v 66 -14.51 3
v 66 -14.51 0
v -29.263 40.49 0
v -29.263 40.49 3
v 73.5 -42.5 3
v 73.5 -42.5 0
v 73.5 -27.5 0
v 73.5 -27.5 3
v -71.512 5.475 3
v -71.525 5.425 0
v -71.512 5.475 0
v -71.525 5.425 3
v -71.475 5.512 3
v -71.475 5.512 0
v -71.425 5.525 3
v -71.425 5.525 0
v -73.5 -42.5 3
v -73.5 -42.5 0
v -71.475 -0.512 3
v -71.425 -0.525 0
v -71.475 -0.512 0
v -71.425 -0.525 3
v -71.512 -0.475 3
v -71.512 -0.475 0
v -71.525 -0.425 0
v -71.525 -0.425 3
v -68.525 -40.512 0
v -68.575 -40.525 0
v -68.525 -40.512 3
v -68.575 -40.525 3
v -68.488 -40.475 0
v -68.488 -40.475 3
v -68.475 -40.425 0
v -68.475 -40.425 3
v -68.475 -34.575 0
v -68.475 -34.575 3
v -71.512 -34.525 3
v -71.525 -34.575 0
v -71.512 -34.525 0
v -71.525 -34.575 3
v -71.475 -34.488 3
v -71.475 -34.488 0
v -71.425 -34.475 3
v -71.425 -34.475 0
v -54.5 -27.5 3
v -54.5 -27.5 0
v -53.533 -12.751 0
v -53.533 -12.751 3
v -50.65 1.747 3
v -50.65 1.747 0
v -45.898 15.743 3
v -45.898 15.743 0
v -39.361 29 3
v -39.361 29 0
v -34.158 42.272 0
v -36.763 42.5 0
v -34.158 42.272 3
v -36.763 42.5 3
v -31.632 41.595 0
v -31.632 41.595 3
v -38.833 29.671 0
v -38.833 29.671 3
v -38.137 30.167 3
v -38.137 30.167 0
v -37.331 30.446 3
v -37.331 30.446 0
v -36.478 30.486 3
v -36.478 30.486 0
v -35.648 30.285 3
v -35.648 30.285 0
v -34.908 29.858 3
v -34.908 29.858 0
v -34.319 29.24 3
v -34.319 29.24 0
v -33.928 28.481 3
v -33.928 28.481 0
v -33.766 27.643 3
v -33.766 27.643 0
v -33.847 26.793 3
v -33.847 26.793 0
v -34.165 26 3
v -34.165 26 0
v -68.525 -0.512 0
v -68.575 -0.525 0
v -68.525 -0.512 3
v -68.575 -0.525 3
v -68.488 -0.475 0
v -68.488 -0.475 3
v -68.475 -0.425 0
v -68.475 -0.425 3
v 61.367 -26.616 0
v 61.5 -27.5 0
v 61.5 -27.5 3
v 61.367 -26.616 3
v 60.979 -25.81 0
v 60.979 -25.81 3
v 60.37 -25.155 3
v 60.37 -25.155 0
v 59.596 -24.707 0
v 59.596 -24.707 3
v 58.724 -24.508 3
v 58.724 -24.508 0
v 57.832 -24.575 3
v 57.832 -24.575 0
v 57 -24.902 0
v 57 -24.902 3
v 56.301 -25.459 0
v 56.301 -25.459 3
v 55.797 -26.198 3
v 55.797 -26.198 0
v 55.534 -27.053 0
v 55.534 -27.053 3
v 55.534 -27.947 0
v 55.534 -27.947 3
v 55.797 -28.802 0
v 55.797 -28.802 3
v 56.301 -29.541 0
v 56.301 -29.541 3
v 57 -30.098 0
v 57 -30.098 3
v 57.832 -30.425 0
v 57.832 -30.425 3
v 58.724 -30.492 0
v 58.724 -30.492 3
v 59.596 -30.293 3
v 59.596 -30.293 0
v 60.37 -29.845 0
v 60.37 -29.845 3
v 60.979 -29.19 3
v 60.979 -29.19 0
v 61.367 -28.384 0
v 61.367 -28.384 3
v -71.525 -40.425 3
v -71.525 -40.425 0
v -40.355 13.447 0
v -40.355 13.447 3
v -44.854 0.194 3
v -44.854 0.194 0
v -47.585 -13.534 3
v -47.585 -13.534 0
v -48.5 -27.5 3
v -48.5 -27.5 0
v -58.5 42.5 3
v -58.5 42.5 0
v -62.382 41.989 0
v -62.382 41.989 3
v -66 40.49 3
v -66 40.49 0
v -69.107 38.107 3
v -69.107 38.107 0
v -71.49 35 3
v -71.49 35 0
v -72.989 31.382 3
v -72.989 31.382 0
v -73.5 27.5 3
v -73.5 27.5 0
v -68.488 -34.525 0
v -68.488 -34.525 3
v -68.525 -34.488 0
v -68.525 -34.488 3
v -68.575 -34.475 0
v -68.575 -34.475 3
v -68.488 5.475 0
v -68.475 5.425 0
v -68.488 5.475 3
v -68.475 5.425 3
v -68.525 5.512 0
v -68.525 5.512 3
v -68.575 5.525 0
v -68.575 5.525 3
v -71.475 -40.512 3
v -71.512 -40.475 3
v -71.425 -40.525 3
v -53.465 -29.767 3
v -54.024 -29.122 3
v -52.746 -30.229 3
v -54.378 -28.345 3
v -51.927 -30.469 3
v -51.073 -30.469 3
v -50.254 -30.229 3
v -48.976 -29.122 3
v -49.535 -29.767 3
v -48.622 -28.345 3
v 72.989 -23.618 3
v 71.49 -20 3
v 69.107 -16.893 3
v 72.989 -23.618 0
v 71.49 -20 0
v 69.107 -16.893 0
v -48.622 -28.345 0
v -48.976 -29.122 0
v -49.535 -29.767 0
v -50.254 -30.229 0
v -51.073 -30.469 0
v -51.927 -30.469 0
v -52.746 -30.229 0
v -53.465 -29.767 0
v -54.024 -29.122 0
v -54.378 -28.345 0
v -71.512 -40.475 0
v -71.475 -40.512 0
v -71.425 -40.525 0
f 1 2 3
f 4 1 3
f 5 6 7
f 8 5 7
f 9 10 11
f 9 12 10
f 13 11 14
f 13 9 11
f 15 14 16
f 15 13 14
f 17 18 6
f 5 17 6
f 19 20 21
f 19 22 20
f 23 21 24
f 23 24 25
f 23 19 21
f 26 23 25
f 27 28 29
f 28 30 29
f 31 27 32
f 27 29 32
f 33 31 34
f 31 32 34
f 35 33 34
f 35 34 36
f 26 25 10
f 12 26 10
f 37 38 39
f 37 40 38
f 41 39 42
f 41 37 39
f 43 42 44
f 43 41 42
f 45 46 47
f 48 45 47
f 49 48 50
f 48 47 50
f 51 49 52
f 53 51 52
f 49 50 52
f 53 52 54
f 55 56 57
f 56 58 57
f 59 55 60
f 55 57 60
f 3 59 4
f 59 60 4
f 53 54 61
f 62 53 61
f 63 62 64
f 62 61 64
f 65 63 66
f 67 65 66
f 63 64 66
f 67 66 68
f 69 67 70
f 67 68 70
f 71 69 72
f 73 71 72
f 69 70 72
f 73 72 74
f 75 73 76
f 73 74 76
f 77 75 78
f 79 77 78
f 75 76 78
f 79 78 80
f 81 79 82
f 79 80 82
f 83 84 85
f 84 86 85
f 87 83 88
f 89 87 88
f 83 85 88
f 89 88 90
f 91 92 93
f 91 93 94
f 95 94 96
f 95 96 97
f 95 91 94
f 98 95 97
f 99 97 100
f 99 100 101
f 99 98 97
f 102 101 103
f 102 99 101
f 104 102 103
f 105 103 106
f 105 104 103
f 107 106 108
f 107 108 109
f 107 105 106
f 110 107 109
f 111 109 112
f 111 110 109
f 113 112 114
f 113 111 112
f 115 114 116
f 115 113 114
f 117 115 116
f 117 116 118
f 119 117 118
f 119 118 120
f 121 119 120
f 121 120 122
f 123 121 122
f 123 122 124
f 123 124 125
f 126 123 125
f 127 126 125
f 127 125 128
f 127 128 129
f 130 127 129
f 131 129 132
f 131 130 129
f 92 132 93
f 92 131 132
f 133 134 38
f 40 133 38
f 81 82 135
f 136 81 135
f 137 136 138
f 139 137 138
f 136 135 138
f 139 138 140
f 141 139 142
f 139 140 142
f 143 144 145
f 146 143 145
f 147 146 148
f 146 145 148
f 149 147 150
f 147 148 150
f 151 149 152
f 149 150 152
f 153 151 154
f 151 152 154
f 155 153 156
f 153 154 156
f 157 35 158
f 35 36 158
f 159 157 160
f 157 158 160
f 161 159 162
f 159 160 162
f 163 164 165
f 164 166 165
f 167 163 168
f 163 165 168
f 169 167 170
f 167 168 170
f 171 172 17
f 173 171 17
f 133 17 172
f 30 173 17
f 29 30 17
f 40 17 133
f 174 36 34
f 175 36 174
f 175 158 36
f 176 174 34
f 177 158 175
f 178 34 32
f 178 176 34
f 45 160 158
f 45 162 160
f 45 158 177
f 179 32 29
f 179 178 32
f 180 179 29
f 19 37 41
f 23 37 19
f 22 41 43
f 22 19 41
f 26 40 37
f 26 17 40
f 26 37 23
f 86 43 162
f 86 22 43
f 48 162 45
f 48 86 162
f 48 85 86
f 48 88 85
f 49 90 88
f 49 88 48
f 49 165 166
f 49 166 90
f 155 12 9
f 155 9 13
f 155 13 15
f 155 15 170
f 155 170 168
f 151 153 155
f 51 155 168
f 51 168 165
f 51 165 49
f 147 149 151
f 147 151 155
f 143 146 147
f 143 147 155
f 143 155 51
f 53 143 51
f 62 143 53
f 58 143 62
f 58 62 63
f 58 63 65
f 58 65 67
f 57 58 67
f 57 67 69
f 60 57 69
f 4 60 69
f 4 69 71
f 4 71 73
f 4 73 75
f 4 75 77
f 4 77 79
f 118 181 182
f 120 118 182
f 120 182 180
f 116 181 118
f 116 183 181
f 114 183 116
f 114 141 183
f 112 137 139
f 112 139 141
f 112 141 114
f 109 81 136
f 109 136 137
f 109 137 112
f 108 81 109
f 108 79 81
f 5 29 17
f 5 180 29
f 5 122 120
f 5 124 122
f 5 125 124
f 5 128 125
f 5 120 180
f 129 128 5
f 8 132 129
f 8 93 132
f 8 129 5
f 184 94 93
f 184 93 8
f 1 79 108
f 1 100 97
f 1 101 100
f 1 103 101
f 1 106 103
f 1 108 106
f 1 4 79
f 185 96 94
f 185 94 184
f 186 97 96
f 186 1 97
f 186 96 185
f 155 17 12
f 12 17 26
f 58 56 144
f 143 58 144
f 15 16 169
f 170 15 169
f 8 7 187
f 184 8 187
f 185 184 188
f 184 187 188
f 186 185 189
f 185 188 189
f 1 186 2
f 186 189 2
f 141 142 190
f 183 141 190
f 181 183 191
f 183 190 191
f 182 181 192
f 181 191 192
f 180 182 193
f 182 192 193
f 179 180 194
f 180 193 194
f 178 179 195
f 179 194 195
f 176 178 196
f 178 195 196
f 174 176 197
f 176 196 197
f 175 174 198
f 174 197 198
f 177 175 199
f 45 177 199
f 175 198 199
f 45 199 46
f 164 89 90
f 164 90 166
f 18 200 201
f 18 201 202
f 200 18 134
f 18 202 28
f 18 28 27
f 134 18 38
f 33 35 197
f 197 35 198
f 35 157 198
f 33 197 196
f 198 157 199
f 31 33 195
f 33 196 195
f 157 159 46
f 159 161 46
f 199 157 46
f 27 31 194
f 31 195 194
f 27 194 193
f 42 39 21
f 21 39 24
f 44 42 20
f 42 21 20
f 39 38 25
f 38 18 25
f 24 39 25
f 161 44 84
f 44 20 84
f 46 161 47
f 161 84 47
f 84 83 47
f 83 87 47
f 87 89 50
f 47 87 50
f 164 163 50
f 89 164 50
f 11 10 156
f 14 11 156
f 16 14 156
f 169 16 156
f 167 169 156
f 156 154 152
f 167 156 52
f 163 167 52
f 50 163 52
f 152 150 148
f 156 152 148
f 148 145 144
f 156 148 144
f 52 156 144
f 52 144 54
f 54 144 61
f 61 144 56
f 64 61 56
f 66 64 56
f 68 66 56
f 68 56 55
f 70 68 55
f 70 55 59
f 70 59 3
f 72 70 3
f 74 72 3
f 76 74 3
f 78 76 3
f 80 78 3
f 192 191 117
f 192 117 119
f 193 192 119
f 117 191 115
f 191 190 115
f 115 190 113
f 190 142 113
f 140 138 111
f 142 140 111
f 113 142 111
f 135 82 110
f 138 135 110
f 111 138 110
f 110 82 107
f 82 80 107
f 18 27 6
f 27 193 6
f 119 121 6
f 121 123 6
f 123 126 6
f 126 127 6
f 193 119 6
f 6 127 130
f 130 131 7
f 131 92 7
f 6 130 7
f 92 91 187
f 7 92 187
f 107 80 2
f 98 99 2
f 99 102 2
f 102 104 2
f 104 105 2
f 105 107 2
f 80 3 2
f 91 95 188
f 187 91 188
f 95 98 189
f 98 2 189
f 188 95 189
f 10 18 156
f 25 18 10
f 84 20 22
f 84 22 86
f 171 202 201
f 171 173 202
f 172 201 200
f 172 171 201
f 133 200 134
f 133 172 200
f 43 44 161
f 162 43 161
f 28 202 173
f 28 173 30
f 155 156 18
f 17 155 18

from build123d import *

# Parameters (mm, degrees)
SKETCH1_W           = 3.05
SKETCH1_H           = 6.05
SKETCH1_R           = 3
BOSS_EXTRUDE1_DEPTH = 3
FILLET1_R           = 15
FILLET2_R           = 0.1


with BuildPart() as part:
    # Sketch1 → Boss-Extrude1 (new body)
    with BuildSketch(Plane.XY):
        with BuildLine():
            Line((-32.74355653, 42.5), (-58.5, 42.5))
            ThreePointArc((-58.5, 42.5), (-69.106601718, 38.106601718), (-73.5, 27.5))
            Line((-73.5, 27.5), (-73.5, -42.5))
            Line((-73.5, -42.5), (73.5, -42.5))
            Line((73.5, -42.5), (73.5, -27.5))
            ThreePointArc((73.5, -27.5), (71.490381057, -20), (66, -14.509618943))
            Line((66, -14.509618943), (-32.74355653, 42.5))
        make_face()
        with BuildLine():
            ThreePointArc((-48.5, -27.5), (-51.500000015, -30.5), (-54.5, -27.499999969))
            ThreePointArc((-54.5, -27.499999969), (-50.649618339, 1.746552215), (-39.36087052, 29.000000186))
            ThreePointArc((-39.36087052, 29.000000186), (-35.262794319, 30.098076155), (-34.16471821, 25.999999992))
            ThreePointArc((-34.16471821, 25.999999992), (-44.854063414, 0.193637821), (-48.5, -27.5))
        make_face(mode=Mode.SUBTRACT)
        with Locations((-70, -37.5)):
            Rectangle(SKETCH1_W, SKETCH1_H, mode=Mode.SUBTRACT)
        with Locations((-70, 2.5)):
            Rectangle(SKETCH1_W, SKETCH1_H, mode=Mode.SUBTRACT)
        with Locations((58.5, -27.5)):
            Circle(SKETCH1_R, mode=Mode.SUBTRACT)
    extrude(amount=BOSS_EXTRUDE1_DEPTH)

    # Fillet1
    fillet1_edges = [part.edges().sort_by_distance(p)[0] for p in [
        (-32.74355653, 42.5, 1.5),
    ]]
    fillet(fillet1_edges, radius=FILLET1_R)

    # Fillet2
    fillet2_edges = [part.edges().sort_by_distance(p)[0] for p in [
        (-68.475, -0.525, 1.5),
        (-68.475, 5.525, 1.5),
        (-71.525, 5.525, 1.5),
        (-71.525, -0.525, 1.5),
        (-68.475, -34.475, 1.5),
        (-71.525, -34.475, 1.5),
        (-71.525, -40.525, 1.5),
        (-68.475, -40.525, 1.5),
    ]]
    fillet(fillet2_edges, radius=FILLET2_R)


solid = part.part
